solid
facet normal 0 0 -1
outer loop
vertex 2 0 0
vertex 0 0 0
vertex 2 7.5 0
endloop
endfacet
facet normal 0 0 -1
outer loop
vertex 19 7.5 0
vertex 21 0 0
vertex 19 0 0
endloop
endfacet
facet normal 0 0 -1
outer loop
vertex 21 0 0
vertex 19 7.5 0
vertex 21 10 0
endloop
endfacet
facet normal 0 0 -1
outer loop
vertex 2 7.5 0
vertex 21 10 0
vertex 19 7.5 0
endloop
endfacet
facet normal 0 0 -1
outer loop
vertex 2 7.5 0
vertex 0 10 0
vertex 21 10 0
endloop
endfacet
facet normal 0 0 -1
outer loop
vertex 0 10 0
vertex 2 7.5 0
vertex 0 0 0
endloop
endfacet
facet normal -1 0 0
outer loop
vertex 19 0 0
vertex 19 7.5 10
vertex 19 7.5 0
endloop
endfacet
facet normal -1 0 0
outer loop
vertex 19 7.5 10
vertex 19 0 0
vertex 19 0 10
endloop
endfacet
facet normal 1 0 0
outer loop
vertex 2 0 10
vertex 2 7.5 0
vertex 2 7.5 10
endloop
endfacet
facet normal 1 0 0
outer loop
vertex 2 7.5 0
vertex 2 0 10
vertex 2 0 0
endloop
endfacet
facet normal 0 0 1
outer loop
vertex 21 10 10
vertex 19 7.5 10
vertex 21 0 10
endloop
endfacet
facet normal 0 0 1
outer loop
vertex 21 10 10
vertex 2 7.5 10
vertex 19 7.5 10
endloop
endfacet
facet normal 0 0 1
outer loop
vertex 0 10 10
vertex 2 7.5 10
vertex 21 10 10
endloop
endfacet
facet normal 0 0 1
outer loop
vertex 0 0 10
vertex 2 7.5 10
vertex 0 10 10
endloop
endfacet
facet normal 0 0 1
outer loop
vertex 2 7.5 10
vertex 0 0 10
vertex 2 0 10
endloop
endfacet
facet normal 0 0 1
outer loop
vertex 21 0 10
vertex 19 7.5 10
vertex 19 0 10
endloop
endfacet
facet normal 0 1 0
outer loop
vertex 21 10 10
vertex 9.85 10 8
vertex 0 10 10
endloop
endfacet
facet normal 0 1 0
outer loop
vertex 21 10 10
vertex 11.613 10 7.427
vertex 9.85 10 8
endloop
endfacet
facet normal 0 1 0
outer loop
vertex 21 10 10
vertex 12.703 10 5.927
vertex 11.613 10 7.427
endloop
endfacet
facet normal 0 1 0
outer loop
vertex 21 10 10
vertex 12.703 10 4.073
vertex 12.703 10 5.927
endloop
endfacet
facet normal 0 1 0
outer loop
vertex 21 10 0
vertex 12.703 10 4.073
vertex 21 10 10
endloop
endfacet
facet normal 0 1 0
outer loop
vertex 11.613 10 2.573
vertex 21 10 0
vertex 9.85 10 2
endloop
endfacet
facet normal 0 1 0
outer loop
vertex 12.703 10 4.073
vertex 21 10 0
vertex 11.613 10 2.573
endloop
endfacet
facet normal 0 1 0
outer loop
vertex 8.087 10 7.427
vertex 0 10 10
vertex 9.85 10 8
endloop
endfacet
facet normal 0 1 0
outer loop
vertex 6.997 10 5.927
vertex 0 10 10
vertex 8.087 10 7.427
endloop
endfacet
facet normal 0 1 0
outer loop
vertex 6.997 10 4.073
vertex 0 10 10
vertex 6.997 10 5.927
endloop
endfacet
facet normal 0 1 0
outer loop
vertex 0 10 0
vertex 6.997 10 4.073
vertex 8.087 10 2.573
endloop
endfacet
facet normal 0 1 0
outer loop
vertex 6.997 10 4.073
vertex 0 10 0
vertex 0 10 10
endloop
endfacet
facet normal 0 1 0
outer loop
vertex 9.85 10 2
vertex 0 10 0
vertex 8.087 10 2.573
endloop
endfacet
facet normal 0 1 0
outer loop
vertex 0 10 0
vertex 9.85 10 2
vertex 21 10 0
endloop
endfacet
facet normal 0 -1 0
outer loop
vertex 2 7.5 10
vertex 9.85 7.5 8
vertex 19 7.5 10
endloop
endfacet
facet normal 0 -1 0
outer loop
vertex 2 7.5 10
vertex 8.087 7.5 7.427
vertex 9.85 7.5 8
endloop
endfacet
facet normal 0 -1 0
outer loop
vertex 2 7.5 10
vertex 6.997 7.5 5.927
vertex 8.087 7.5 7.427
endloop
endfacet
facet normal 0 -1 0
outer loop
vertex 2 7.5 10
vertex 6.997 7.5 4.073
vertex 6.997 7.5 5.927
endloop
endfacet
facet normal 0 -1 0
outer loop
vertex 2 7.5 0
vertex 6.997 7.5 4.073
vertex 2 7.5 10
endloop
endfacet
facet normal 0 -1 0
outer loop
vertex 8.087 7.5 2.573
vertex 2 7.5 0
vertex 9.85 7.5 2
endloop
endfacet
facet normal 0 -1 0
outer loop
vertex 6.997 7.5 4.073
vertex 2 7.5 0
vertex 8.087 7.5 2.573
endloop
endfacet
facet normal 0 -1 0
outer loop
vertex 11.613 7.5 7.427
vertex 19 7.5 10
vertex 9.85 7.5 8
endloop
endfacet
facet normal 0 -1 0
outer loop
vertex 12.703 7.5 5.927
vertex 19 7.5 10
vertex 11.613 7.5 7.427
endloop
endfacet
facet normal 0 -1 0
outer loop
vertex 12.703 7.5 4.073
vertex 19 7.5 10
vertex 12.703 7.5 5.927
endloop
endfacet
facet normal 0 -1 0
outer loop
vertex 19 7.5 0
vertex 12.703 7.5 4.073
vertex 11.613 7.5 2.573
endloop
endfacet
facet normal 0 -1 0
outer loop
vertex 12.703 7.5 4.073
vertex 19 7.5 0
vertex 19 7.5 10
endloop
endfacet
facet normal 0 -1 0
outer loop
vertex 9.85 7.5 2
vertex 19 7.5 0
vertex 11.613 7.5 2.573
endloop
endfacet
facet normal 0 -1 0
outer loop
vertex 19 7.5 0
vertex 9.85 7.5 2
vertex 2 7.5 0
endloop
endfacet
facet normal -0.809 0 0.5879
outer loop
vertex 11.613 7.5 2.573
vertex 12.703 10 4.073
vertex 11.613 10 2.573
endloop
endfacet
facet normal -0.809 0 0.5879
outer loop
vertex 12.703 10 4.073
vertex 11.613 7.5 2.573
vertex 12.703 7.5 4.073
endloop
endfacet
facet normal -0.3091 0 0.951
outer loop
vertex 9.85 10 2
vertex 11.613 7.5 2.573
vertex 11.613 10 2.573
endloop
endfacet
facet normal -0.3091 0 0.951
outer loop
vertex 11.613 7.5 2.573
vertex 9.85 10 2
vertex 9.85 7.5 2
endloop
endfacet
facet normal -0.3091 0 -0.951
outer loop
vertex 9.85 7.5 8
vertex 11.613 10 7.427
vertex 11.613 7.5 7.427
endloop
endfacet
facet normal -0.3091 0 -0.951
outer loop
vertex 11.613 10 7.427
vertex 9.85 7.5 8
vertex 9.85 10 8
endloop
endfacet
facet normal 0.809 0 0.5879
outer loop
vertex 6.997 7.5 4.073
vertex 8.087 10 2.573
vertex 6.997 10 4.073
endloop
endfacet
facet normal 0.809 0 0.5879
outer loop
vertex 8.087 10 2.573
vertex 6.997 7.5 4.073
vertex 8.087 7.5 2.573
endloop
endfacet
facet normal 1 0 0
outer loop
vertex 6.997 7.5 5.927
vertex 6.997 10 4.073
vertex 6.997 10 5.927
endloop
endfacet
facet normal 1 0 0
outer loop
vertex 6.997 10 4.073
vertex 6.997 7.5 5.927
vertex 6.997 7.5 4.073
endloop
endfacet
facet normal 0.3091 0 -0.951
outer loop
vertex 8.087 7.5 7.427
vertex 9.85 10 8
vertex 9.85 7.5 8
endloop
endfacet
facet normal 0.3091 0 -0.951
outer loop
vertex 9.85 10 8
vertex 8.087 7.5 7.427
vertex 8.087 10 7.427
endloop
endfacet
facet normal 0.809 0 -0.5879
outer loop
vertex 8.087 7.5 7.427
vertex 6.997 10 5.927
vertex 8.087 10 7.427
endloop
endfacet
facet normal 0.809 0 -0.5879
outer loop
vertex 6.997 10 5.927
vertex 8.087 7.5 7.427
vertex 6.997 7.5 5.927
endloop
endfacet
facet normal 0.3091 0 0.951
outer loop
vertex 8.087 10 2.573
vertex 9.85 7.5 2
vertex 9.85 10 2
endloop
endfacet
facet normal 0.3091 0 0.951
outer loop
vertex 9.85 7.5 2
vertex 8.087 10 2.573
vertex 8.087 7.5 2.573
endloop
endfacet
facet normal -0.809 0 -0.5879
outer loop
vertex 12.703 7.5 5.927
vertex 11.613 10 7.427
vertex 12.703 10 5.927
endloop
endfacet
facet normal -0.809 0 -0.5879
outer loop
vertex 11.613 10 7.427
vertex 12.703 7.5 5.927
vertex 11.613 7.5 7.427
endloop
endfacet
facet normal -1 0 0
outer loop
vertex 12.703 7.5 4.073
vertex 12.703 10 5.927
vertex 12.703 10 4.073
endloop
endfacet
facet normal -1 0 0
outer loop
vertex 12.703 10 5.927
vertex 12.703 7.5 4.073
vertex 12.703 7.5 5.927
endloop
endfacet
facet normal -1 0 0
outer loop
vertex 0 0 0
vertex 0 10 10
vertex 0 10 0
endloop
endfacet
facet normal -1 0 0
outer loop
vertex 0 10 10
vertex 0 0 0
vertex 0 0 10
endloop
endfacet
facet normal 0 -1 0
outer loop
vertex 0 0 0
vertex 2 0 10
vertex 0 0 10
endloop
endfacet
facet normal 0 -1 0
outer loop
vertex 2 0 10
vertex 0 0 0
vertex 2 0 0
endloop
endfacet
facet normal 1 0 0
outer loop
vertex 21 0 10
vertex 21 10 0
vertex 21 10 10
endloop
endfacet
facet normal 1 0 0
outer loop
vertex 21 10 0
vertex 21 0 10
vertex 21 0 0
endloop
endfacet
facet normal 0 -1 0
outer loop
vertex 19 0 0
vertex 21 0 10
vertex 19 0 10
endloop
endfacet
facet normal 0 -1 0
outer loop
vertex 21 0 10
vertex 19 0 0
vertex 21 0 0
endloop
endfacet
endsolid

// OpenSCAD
/*
//top flap
	//horizontal
	translate(v=[33,0,11.7]) cube(size=[10,5,3.65], center = false);
	//vertical
	translate(v=[33,-8,15.35]) cube(size=[10, 13, 3.65], center = false);
*/


//body
rotate(a=[0,90,0]) translate(v=[-43,5,4])
difference(){
	translate(v=[33,2.5,-2]) cube(size = [10,2.5,17], center = false);

	//circle
	rotate(a=[90,0,0]) translate (v=[38,5.85,-8.5]) //trans is (x,z,y) 
	cylinder(h=7, r=3,center = false);
}

//left flap
rotate(a=[0, 90, 0]) translate (v = [-10,0,0]) cube(size = [10, 10, 2], center= false);

//right flap
rotate(a=[0, 90, 0]) translate (v = [-10,0,19]) cube(size = [10, 10, 2], center= false);
